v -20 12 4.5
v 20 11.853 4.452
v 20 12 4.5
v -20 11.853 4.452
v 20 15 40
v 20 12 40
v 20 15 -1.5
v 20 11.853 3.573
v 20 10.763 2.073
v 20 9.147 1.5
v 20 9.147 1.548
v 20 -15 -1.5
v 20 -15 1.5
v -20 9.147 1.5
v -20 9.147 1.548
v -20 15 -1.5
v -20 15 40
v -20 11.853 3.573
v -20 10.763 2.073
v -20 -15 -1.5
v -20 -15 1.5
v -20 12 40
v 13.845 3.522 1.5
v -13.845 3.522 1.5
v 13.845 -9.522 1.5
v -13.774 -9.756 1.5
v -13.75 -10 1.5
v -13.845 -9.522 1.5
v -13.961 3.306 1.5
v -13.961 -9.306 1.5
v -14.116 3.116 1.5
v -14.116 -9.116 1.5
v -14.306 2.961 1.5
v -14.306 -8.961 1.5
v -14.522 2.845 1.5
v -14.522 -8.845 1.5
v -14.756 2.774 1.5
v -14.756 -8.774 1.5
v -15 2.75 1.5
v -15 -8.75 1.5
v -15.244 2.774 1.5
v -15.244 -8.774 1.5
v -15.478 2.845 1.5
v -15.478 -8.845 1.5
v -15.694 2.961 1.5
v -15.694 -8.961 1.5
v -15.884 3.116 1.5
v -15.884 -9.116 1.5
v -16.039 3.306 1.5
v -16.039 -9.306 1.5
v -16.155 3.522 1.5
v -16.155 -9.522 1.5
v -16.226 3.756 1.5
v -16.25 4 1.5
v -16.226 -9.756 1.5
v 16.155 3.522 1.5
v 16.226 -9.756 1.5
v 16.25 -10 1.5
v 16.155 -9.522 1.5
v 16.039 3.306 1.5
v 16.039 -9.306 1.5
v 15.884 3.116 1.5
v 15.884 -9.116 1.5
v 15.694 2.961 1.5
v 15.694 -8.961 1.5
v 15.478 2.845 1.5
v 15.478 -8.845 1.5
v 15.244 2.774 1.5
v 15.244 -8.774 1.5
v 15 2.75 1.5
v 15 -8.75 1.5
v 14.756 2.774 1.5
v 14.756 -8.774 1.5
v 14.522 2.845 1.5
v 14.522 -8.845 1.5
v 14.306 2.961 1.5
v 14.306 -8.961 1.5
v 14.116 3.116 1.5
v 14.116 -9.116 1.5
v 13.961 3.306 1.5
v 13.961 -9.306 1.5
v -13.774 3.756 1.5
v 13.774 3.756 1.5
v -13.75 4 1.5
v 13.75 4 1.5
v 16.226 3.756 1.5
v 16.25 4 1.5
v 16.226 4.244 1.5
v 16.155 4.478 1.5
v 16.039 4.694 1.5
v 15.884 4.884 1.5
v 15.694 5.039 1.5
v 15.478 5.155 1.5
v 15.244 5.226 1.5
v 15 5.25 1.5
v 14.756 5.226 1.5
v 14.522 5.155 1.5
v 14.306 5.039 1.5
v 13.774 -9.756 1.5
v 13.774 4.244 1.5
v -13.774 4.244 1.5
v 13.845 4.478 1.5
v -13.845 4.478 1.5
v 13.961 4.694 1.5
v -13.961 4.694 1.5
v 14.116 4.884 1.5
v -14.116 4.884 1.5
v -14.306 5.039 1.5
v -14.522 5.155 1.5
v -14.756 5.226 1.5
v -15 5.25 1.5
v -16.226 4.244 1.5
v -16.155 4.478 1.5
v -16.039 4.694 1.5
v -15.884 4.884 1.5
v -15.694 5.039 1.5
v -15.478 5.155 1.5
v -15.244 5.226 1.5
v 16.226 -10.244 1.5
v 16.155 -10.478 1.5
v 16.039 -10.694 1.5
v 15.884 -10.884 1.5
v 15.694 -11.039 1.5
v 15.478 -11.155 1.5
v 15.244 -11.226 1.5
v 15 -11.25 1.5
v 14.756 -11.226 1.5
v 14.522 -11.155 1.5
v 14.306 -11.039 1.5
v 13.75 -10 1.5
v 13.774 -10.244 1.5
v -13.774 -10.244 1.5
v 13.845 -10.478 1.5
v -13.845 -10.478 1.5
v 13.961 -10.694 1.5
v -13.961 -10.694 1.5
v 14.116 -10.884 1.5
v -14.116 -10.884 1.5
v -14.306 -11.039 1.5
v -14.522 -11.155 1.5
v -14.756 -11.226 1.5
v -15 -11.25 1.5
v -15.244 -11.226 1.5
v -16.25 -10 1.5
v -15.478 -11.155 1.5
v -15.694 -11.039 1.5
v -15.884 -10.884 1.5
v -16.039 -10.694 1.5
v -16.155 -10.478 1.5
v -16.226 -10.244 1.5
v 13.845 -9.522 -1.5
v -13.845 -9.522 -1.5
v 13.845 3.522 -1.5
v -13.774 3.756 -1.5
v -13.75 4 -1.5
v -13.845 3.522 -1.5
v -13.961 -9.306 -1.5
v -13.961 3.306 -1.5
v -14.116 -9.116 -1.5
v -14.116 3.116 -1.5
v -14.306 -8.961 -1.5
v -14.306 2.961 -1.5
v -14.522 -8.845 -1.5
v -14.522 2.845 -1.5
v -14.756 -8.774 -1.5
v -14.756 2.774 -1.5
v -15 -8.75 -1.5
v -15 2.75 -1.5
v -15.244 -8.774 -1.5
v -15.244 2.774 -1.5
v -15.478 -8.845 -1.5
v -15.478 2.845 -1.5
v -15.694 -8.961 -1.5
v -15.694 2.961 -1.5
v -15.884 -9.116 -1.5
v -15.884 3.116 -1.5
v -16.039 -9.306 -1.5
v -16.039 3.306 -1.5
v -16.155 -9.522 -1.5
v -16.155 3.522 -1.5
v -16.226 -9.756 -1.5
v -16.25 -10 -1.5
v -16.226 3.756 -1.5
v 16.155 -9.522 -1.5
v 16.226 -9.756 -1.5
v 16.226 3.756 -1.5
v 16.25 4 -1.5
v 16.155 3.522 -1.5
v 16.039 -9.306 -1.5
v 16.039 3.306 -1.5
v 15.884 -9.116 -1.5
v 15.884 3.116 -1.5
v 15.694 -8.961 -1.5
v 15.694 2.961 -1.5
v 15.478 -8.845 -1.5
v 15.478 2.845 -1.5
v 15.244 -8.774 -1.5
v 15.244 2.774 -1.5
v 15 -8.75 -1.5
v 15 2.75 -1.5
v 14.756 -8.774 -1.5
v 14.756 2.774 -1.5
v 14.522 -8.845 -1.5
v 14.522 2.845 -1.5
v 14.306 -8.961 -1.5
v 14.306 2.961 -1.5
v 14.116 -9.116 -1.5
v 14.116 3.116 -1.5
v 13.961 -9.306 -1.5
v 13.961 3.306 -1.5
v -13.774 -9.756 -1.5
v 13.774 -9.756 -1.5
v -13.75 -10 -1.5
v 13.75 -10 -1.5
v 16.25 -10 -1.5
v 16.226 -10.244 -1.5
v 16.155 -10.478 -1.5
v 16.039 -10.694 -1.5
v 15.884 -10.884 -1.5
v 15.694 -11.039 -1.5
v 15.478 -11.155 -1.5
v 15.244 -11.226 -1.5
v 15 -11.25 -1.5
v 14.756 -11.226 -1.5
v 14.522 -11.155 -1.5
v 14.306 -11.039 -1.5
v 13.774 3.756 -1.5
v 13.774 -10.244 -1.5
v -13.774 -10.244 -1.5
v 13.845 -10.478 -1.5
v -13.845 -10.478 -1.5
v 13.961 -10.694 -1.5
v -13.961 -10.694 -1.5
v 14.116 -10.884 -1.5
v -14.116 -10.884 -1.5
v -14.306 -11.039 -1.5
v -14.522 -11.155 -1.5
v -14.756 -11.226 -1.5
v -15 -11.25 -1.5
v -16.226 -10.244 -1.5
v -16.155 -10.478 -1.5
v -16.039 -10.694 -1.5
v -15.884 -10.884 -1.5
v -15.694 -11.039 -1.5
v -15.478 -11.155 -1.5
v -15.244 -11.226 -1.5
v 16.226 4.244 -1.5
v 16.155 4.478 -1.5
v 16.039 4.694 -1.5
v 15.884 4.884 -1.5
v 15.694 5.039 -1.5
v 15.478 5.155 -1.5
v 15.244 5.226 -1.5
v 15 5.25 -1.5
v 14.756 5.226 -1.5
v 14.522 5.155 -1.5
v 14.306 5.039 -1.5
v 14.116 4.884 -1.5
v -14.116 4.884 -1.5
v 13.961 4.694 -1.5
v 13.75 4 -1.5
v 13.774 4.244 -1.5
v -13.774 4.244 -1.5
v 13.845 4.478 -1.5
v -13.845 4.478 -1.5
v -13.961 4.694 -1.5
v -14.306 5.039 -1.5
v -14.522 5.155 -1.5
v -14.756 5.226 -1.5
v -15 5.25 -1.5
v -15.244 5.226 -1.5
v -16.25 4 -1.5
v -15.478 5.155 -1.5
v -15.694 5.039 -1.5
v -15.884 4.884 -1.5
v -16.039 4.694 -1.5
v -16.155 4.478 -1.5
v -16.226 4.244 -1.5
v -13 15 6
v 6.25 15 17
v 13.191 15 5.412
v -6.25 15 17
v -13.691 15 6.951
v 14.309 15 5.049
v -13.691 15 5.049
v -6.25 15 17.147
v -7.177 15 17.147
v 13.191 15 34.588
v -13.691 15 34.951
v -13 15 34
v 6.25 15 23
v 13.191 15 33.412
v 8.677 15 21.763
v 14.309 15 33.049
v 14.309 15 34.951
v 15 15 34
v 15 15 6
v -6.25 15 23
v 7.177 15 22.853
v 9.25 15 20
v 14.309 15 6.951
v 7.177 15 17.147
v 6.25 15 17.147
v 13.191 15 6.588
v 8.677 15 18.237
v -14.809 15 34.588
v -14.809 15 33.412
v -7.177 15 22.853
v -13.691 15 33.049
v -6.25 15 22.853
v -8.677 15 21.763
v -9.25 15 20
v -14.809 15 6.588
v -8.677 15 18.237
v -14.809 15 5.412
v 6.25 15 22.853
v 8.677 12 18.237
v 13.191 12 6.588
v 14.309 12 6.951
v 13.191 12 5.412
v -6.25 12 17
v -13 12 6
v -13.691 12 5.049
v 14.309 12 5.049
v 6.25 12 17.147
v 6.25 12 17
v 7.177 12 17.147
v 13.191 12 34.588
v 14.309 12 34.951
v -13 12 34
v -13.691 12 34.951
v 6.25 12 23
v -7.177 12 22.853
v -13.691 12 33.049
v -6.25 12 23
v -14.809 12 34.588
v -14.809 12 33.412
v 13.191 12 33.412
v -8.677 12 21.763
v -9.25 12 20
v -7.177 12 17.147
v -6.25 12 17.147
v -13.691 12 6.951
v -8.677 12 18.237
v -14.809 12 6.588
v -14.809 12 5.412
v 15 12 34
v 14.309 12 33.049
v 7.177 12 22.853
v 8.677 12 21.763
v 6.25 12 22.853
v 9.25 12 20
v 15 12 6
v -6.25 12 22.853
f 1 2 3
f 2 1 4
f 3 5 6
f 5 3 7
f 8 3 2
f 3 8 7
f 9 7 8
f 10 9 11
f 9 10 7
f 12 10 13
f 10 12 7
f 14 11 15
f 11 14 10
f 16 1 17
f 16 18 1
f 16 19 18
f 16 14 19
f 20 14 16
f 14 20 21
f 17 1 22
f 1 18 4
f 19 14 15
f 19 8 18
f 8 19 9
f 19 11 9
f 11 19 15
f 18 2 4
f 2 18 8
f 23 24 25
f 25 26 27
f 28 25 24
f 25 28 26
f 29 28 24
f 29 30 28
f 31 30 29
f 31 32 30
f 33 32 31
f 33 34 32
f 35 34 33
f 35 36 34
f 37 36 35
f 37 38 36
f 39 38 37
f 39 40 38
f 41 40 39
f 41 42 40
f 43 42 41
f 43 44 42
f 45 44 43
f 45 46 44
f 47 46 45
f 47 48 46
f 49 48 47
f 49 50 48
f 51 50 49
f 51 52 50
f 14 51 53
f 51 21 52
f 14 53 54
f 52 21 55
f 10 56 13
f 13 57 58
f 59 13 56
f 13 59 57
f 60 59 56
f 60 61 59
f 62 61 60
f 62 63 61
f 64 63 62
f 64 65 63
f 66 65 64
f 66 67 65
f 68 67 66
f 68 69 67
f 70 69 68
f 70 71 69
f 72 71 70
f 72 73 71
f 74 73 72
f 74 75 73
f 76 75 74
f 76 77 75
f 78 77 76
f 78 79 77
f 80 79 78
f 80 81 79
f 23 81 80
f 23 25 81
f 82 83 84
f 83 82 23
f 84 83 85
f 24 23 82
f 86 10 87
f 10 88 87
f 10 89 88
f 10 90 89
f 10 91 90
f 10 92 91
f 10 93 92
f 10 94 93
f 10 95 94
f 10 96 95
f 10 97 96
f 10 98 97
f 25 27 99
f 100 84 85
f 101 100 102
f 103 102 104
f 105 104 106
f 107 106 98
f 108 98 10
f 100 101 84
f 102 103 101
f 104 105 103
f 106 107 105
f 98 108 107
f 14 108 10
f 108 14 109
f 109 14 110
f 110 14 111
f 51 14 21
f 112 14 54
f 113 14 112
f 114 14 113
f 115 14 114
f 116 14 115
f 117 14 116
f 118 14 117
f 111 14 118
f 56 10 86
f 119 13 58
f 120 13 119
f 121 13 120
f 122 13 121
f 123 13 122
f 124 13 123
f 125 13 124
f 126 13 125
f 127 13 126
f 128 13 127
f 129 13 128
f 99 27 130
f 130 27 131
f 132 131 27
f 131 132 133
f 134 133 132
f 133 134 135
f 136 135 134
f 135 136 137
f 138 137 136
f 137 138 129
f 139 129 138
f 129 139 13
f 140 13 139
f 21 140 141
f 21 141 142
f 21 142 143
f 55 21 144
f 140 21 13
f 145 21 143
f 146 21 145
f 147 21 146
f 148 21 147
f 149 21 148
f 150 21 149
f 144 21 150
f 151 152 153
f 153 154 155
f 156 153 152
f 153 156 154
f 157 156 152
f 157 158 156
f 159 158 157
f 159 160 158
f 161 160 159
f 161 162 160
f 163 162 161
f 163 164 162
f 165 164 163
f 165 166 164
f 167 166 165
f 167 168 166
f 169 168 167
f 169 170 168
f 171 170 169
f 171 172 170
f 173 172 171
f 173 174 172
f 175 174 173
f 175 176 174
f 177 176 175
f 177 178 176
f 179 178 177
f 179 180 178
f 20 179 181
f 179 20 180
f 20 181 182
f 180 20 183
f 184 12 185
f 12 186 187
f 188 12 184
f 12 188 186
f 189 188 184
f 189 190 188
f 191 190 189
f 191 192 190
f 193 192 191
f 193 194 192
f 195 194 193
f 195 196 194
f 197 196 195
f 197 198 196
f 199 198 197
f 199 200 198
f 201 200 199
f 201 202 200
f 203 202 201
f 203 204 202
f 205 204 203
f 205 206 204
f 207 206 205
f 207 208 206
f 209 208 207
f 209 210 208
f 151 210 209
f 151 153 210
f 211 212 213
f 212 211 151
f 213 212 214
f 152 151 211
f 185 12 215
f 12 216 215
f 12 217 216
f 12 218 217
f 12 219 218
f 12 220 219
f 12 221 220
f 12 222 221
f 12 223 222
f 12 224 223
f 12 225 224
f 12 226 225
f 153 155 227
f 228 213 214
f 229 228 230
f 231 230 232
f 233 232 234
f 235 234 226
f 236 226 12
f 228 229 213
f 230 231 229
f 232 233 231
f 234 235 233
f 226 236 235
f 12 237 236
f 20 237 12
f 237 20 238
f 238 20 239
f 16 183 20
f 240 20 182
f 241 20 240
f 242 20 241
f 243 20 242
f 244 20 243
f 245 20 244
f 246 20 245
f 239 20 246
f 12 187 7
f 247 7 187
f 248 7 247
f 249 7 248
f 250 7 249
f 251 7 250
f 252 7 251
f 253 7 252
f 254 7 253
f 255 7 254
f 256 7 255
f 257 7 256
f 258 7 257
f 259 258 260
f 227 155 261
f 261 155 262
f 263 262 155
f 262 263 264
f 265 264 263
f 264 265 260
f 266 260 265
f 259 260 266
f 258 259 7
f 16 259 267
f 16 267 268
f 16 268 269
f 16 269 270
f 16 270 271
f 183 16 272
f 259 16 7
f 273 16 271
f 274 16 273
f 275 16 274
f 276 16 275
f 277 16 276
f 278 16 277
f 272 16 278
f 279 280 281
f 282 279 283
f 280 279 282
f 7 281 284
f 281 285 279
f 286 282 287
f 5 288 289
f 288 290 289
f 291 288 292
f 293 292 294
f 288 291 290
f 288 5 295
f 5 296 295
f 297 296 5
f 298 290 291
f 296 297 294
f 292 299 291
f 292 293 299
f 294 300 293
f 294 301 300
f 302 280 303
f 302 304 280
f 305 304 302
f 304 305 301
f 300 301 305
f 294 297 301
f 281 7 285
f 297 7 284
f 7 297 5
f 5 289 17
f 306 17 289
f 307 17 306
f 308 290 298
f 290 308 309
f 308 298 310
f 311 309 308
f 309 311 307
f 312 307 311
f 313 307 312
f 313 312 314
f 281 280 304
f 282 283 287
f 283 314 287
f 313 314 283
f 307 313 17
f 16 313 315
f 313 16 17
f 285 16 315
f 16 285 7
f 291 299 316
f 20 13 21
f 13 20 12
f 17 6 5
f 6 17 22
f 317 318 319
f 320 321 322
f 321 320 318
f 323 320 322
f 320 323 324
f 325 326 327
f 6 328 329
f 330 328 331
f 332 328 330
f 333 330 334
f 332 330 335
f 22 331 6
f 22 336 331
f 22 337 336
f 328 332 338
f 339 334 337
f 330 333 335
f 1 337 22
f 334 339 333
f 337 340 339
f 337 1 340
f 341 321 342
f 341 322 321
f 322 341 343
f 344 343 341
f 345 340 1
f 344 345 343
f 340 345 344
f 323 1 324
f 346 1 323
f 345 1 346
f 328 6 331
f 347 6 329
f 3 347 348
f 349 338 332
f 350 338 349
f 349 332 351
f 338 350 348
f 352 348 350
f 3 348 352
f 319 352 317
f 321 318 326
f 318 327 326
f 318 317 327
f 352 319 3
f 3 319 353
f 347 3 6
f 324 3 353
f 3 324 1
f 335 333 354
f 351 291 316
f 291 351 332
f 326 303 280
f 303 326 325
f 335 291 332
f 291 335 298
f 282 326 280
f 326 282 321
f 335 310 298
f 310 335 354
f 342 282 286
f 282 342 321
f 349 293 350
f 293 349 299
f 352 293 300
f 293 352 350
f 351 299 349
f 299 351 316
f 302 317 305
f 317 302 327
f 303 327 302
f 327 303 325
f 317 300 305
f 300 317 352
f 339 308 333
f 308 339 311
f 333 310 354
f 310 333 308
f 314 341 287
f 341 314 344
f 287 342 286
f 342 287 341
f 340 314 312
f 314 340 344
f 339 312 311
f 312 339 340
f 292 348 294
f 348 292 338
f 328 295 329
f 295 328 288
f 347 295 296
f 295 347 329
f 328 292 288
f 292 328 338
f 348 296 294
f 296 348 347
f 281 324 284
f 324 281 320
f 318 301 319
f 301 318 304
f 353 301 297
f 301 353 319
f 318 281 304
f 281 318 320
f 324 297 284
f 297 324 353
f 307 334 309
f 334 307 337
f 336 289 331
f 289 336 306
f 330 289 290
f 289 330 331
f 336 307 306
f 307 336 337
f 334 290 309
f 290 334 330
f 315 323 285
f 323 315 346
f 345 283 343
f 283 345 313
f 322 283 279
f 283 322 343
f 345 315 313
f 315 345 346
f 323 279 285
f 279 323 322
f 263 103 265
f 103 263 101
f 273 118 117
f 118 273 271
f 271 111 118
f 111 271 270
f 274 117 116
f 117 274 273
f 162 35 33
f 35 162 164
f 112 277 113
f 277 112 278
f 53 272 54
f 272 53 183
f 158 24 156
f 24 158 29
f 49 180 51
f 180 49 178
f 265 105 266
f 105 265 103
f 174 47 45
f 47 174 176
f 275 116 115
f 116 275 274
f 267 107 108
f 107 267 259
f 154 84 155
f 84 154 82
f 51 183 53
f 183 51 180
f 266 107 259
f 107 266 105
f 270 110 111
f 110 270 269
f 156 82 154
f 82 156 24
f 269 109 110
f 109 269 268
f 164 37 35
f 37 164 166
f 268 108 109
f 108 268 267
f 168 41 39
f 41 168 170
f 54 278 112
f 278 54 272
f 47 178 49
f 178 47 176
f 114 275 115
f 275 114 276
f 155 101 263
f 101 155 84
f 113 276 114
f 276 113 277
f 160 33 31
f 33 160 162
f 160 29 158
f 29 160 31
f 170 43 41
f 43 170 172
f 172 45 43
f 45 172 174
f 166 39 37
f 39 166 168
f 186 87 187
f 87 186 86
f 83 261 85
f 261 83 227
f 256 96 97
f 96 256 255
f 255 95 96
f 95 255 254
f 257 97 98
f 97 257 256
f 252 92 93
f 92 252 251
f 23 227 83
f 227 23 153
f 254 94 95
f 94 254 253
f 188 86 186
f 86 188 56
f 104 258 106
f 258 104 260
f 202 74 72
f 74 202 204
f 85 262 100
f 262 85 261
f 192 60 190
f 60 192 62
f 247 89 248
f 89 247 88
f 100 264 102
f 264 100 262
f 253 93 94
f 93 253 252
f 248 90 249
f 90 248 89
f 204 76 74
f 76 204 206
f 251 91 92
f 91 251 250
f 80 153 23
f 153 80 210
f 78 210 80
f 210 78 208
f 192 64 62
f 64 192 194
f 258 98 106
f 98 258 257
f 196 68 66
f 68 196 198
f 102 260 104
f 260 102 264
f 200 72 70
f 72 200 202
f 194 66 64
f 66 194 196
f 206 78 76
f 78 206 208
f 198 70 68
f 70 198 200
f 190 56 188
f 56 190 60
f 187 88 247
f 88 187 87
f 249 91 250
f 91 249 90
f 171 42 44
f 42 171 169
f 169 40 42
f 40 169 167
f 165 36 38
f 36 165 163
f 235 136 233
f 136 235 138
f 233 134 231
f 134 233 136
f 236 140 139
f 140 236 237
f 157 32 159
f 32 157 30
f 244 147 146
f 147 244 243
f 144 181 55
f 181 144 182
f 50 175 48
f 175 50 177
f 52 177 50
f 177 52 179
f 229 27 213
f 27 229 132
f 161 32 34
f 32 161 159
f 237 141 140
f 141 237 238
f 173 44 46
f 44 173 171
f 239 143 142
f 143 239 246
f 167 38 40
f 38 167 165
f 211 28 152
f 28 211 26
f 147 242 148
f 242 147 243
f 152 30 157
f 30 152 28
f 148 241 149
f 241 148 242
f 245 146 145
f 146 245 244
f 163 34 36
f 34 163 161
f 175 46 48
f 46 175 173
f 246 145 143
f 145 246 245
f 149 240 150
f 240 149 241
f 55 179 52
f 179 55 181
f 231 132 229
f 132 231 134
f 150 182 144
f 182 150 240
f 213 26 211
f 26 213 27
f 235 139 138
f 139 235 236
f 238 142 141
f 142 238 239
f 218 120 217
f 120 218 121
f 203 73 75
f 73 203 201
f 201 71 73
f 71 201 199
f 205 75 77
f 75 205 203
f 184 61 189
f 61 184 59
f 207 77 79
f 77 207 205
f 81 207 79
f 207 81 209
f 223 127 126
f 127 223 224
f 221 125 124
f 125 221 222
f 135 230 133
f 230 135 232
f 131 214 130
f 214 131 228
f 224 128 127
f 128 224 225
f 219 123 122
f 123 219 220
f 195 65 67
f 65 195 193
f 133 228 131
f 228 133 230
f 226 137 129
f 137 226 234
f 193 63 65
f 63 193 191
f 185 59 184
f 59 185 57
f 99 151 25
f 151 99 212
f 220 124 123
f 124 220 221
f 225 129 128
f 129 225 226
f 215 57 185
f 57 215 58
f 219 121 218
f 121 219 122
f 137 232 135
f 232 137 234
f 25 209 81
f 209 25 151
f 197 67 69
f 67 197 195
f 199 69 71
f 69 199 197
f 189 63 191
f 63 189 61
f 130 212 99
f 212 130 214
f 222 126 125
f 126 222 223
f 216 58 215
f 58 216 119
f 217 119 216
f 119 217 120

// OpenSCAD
module CameraMount(width, length, depth) {
  // bracket
  cube([width, length, depth], center=true);
  translate([0.0, (length / 2.0) - depth / 2.0, width / 2.0]) {
    cube([width, depth, width], center=true);
  }

  // fillet
  translate([0, (length / 2.0) - depth, depth / 2.0]) {
      rotate([0, 90]) {
        difference() {
            cylinder(r=3, h=width, center=true);
            translate([-3.0, -3.0, 0.0]) {
              cylinder(r=3, h=width, center=true);
            }
        }
      }
  }
}

module USBCameraMountHoles(depth) {
  mount_width = 28.0;
  screw_type = 2.0;

  translate([mount_width / 2.0, mount_width / 2.0]) {
    #cylinder(r=screw_type / 2.0, h=depth, center=true);
  }
  translate([mount_width / 2.0, -mount_width / 2.0]) {
    #cylinder(r=screw_type / 2.0, h=depth, center=true);
  }
  translate([-mount_width / 2.0, mount_width / 2.0]) {
    #cylinder(r=screw_type / 2.0, h=depth, center=true);
  }
  translate([-mount_width / 2.0, -mount_width / 2.0]) {
    #cylinder(r=screw_type / 2.0, h=depth, center=true);
  }
}

module PointGreyMountHoles(depth) {
  mount_width = 30.0;
  mount_height = 14.0;
  $fn = 32.0;
  screw_type = 2.5;

  translate([mount_height / 2.0, mount_width / 2.0]) {
    #cylinder(r=screw_type / 2.0, h=depth, center=true);
  }
  translate([mount_height / 2.0, -mount_width / 2.0]) {
    #cylinder(r=screw_type / 2.0, h=depth, center=true);
  }
  translate([-mount_height / 2.0, mount_width / 2.0]) {
    #cylinder(r=screw_type / 2.0, h=depth, center=true);
  }
  translate([-mount_height / 2.0, -mount_width / 2.0]) {
    #cylinder(r=screw_type / 2.0, h=depth, center=true);
  }
}

difference() {
  mount_width = 40.0;
  mount_length = 30.0;
  mount_depth = 3.0;

  // camera mount
  CameraMount(mount_width, mount_length, mount_depth);

  // cable holes
  translate([0.0,
             mount_length / 2.0 - mount_depth / 2.0,
             mount_width / 2.0]) {
    #cube([12.5, mount_depth, 6.0], center=true);

    translate([12.5 / 2.0, 0.0]) {
      rotate([90, 0]) {
        #cylinder(r = 6 / 2.0, h = mount_depth + 1.0, center = true);
      }
    }

    translate([-12.5 / 2.0, 0.0]) {
      rotate([90, 0]) {
        #cylinder(r = 6.0 / 2.0, h = mount_depth + 1.0, center = true);
      }
    }
  }

  // usb camera mount holes
  translate([0.0, mount_length / 2.0 - mount_depth / 2.0, mount_width / 2.0]) {
    rotate([90.0, 0.0]) {
      USBCameraMountHoles(mount_depth + 0.1);
    }
  }

  // point grey mount holes
  translate([0.0, -mount_depth, 0.0]) {
    rotate(90) {
      PointGreyMountHoles(mount_depth + 0.1);
    }
  }
}
